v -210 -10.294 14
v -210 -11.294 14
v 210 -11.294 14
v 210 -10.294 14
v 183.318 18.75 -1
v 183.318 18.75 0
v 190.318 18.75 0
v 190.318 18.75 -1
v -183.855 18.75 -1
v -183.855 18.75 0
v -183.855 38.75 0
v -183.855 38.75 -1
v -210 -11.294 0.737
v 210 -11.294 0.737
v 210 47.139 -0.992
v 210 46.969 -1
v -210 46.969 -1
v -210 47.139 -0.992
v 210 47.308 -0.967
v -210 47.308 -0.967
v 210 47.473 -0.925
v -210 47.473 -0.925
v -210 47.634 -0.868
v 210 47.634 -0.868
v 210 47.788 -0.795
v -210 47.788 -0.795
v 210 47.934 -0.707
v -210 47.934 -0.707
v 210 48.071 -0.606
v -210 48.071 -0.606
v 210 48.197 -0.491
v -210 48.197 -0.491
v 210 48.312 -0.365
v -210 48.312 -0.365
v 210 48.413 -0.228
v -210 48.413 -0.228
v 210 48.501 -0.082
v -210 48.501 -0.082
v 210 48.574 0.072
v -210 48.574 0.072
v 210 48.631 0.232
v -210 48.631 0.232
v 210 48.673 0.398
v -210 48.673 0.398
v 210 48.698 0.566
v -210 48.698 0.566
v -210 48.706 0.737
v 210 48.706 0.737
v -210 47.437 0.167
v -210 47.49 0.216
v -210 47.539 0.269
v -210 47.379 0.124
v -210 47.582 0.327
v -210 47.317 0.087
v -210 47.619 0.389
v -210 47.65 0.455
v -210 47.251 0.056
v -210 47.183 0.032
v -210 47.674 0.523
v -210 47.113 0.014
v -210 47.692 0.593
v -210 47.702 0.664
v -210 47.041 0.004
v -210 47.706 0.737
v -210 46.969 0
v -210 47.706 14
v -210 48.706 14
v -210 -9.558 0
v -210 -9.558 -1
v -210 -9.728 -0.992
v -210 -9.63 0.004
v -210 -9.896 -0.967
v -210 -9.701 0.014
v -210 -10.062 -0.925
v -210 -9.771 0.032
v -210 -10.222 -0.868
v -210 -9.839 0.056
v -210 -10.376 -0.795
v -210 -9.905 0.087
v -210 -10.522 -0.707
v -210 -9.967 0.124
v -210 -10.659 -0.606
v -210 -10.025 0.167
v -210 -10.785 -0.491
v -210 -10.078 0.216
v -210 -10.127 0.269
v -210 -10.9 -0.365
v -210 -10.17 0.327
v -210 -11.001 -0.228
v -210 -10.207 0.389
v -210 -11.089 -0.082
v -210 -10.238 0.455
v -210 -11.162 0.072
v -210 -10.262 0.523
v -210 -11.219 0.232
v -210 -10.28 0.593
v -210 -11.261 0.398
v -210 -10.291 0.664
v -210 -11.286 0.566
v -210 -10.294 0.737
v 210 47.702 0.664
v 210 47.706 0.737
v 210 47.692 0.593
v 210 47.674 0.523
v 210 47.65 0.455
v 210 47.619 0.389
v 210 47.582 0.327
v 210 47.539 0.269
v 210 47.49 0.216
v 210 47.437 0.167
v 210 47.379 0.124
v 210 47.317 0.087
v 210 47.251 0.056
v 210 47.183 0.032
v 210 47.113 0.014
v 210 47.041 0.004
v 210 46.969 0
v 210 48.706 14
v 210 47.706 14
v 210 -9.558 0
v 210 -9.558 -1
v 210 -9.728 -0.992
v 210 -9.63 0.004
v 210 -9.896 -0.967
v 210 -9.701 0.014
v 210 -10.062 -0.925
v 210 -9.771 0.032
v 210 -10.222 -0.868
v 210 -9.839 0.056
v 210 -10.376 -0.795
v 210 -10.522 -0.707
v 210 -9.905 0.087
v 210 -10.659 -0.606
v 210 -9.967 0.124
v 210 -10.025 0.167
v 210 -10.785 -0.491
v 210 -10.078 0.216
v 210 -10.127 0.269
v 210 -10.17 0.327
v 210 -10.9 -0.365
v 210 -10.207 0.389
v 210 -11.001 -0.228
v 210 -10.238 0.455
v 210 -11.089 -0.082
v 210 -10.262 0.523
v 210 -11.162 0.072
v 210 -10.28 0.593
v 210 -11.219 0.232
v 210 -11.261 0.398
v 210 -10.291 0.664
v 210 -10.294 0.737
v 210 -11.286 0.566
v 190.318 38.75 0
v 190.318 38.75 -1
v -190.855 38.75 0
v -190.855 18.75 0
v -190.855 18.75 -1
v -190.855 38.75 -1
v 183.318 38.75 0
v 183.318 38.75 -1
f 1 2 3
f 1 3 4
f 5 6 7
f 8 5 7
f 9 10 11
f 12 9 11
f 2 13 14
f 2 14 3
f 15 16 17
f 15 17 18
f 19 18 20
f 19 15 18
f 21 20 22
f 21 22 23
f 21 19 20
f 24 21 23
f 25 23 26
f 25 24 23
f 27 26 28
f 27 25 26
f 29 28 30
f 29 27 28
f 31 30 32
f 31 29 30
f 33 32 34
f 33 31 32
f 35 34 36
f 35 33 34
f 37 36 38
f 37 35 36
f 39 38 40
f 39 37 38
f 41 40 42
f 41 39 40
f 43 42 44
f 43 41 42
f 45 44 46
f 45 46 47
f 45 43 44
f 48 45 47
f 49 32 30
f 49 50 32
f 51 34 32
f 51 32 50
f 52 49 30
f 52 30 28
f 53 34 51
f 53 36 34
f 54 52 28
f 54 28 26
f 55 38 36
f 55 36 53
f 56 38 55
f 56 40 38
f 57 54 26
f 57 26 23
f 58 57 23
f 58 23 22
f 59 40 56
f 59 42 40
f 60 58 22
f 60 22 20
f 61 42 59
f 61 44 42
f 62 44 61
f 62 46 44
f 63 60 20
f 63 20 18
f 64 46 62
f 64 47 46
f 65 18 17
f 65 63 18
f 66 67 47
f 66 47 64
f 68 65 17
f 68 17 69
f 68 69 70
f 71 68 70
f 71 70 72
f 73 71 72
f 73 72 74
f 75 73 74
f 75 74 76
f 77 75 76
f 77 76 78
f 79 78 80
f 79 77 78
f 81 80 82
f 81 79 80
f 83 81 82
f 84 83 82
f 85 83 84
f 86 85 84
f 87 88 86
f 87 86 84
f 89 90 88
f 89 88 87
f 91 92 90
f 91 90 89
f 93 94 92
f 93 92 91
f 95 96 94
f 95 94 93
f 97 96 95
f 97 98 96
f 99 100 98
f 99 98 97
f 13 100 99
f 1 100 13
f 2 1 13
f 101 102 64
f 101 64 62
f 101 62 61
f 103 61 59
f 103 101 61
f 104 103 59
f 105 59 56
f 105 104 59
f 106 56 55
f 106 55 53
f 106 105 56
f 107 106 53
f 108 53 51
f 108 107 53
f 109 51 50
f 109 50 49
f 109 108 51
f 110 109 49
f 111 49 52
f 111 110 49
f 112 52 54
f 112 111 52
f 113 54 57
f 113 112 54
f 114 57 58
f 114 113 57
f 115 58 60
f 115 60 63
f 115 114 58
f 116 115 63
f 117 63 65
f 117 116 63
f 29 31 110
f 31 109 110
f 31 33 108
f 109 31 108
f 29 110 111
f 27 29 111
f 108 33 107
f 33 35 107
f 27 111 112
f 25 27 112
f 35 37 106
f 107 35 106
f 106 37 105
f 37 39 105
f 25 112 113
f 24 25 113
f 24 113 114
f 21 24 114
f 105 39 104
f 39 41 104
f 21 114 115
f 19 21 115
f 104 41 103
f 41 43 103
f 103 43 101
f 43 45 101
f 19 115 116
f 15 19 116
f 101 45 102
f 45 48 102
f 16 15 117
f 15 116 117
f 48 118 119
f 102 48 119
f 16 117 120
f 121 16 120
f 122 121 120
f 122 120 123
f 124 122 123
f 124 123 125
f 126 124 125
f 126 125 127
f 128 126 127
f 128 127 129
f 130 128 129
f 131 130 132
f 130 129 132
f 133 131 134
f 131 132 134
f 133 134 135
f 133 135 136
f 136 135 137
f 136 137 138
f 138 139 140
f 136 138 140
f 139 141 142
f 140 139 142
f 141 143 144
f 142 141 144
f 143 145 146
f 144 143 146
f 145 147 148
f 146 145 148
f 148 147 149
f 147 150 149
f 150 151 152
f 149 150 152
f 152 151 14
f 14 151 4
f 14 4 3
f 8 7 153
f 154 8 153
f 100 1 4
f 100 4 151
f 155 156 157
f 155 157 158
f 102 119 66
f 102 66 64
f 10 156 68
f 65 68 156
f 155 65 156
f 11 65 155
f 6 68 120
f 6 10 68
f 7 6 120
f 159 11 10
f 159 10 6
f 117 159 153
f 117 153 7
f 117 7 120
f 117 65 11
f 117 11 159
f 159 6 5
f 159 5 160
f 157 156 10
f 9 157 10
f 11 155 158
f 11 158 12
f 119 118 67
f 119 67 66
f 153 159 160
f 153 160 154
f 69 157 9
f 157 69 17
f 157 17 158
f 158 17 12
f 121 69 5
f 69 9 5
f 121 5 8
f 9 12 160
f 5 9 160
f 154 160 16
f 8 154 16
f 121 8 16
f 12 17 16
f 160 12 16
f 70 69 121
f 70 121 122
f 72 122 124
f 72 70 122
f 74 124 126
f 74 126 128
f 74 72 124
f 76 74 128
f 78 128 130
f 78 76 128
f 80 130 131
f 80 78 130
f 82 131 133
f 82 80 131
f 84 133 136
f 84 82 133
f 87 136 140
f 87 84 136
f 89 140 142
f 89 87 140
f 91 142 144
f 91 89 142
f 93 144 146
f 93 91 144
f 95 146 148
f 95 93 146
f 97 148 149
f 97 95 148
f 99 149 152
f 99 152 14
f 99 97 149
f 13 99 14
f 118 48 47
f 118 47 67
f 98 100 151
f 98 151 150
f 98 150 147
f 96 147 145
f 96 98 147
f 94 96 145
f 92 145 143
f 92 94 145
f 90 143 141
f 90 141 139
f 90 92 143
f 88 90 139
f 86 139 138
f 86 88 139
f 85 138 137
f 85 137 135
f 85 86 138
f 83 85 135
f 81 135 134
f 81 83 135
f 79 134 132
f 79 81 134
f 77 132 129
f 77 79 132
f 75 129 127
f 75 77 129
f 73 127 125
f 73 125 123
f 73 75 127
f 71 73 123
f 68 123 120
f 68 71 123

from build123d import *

# Parameters (mm, degrees)
SKETCH1_W                    = 420
SKETCH1_H                    = 60
BASE_FLANGE1_DEPTH           = 1
EDGE_FLANGE1_STRIP_W         = 5.4732
EDGE_FLANGE1_STRIP_H         = 1
EDGE_FLANGE1_STRIP_CUT_DEPTH = 420
EDGE_FLANGE1_DEPTH           = 420
EDGE_FLANGE2_STRIP_W         = 5.4732
EDGE_FLANGE2_STRIP_H         = 1
EDGE_FLANGE2_STRIP_CUT_DEPTH = 420
EDGE_FLANGE2_DEPTH           = 420
SKETCH12_W                   = 7
SKETCH12_H                   = 20
CUT_EXTRUDE1_DEPTH           = 217.028384653


# Sheet-metal steps are written as plain solids
with BuildPart() as part:
    # Sketch1 → Base-Flange1 (new body)
    with BuildSketch(Plane.XY):
        with Locations((0, 18.705882353)):
            Rectangle(SKETCH1_W, SKETCH1_H)
    extrude(amount=-BASE_FLANGE1_DEPTH)

    # Edge-Flange1 strip (across the edge) → Edge-Flange1 strip cut (cut)
    with BuildSketch(Plane(origin=(210, 48.705882353, 0), x_dir=(0, -1, 0), z_dir=(-1, 0, 0))):
        with Locations((-1, -0.5)):
            Rectangle(EDGE_FLANGE1_STRIP_W, EDGE_FLANGE1_STRIP_H)
    extrude(amount=EDGE_FLANGE1_STRIP_CUT_DEPTH, mode=Mode.SUBTRACT)

    # Edge-Flange1 section (across the edge) → Edge-Flange1 (add)
    with BuildSketch(Plane(origin=(210, 48.705882353, 0), x_dir=(0, -1, 0), z_dir=(-1, 0, 0))):
        with BuildLine():
            Line((0, 0.7366), (0, 14))
            Line((0, 14), (1, 14))
            Line((1, 14), (1, 0.7366))
            ThreePointArc((1, 0.7366), (1.215745145, 0.215745145), (1.7366, 0))
            Line((1.7366, 0), (1.7366, -1))
            ThreePointArc((1.7366, -1), (0.508638364, -0.491361636), (0, 0.7366))
        make_face()
    extrude(amount=EDGE_FLANGE1_DEPTH)

    # Edge-Flange2 strip (across the edge) → Edge-Flange2 strip cut (cut)
    with BuildSketch(Plane(origin=(-210, -11.294117647, 0), x_dir=(0, 1, 0), z_dir=(1, 0, 0))):
        with Locations((-1, -0.5)):
            Rectangle(EDGE_FLANGE2_STRIP_W, EDGE_FLANGE2_STRIP_H)
    extrude(amount=EDGE_FLANGE2_STRIP_CUT_DEPTH, mode=Mode.SUBTRACT)

    # Edge-Flange2 section (across the edge) → Edge-Flange2 (add)
    with BuildSketch(Plane(origin=(-210, -11.294117647, 0), x_dir=(0, 1, 0), z_dir=(1, 0, 0))):
        with BuildLine():
            Line((0, 0.7366), (0, 14))
            Line((0, 14), (1, 14))
            Line((1, 14), (1, 0.7366))
            ThreePointArc((1, 0.7366), (1.215745145, 0.215745145), (1.7366, 0))
            Line((1.7366, 0), (1.7366, -1))
            ThreePointArc((1.7366, -1), (0.508638364, -0.491361636), (0, 0.7366))
        make_face()
    extrude(amount=EDGE_FLANGE2_DEPTH)

    # Sketch12 → Cut-Extrude1 (cut, through all)
    with BuildSketch(Plane.XY):
        with Locations((186.818027369, 28.75)):
            Rectangle(SKETCH12_W, SKETCH12_H)
        with Locations((-187.355, 28.75)):
            Rectangle(SKETCH12_W, SKETCH12_H)
    extrude(amount=-CUT_EXTRUDE1_DEPTH, mode=Mode.SUBTRACT)


solid = part.part
